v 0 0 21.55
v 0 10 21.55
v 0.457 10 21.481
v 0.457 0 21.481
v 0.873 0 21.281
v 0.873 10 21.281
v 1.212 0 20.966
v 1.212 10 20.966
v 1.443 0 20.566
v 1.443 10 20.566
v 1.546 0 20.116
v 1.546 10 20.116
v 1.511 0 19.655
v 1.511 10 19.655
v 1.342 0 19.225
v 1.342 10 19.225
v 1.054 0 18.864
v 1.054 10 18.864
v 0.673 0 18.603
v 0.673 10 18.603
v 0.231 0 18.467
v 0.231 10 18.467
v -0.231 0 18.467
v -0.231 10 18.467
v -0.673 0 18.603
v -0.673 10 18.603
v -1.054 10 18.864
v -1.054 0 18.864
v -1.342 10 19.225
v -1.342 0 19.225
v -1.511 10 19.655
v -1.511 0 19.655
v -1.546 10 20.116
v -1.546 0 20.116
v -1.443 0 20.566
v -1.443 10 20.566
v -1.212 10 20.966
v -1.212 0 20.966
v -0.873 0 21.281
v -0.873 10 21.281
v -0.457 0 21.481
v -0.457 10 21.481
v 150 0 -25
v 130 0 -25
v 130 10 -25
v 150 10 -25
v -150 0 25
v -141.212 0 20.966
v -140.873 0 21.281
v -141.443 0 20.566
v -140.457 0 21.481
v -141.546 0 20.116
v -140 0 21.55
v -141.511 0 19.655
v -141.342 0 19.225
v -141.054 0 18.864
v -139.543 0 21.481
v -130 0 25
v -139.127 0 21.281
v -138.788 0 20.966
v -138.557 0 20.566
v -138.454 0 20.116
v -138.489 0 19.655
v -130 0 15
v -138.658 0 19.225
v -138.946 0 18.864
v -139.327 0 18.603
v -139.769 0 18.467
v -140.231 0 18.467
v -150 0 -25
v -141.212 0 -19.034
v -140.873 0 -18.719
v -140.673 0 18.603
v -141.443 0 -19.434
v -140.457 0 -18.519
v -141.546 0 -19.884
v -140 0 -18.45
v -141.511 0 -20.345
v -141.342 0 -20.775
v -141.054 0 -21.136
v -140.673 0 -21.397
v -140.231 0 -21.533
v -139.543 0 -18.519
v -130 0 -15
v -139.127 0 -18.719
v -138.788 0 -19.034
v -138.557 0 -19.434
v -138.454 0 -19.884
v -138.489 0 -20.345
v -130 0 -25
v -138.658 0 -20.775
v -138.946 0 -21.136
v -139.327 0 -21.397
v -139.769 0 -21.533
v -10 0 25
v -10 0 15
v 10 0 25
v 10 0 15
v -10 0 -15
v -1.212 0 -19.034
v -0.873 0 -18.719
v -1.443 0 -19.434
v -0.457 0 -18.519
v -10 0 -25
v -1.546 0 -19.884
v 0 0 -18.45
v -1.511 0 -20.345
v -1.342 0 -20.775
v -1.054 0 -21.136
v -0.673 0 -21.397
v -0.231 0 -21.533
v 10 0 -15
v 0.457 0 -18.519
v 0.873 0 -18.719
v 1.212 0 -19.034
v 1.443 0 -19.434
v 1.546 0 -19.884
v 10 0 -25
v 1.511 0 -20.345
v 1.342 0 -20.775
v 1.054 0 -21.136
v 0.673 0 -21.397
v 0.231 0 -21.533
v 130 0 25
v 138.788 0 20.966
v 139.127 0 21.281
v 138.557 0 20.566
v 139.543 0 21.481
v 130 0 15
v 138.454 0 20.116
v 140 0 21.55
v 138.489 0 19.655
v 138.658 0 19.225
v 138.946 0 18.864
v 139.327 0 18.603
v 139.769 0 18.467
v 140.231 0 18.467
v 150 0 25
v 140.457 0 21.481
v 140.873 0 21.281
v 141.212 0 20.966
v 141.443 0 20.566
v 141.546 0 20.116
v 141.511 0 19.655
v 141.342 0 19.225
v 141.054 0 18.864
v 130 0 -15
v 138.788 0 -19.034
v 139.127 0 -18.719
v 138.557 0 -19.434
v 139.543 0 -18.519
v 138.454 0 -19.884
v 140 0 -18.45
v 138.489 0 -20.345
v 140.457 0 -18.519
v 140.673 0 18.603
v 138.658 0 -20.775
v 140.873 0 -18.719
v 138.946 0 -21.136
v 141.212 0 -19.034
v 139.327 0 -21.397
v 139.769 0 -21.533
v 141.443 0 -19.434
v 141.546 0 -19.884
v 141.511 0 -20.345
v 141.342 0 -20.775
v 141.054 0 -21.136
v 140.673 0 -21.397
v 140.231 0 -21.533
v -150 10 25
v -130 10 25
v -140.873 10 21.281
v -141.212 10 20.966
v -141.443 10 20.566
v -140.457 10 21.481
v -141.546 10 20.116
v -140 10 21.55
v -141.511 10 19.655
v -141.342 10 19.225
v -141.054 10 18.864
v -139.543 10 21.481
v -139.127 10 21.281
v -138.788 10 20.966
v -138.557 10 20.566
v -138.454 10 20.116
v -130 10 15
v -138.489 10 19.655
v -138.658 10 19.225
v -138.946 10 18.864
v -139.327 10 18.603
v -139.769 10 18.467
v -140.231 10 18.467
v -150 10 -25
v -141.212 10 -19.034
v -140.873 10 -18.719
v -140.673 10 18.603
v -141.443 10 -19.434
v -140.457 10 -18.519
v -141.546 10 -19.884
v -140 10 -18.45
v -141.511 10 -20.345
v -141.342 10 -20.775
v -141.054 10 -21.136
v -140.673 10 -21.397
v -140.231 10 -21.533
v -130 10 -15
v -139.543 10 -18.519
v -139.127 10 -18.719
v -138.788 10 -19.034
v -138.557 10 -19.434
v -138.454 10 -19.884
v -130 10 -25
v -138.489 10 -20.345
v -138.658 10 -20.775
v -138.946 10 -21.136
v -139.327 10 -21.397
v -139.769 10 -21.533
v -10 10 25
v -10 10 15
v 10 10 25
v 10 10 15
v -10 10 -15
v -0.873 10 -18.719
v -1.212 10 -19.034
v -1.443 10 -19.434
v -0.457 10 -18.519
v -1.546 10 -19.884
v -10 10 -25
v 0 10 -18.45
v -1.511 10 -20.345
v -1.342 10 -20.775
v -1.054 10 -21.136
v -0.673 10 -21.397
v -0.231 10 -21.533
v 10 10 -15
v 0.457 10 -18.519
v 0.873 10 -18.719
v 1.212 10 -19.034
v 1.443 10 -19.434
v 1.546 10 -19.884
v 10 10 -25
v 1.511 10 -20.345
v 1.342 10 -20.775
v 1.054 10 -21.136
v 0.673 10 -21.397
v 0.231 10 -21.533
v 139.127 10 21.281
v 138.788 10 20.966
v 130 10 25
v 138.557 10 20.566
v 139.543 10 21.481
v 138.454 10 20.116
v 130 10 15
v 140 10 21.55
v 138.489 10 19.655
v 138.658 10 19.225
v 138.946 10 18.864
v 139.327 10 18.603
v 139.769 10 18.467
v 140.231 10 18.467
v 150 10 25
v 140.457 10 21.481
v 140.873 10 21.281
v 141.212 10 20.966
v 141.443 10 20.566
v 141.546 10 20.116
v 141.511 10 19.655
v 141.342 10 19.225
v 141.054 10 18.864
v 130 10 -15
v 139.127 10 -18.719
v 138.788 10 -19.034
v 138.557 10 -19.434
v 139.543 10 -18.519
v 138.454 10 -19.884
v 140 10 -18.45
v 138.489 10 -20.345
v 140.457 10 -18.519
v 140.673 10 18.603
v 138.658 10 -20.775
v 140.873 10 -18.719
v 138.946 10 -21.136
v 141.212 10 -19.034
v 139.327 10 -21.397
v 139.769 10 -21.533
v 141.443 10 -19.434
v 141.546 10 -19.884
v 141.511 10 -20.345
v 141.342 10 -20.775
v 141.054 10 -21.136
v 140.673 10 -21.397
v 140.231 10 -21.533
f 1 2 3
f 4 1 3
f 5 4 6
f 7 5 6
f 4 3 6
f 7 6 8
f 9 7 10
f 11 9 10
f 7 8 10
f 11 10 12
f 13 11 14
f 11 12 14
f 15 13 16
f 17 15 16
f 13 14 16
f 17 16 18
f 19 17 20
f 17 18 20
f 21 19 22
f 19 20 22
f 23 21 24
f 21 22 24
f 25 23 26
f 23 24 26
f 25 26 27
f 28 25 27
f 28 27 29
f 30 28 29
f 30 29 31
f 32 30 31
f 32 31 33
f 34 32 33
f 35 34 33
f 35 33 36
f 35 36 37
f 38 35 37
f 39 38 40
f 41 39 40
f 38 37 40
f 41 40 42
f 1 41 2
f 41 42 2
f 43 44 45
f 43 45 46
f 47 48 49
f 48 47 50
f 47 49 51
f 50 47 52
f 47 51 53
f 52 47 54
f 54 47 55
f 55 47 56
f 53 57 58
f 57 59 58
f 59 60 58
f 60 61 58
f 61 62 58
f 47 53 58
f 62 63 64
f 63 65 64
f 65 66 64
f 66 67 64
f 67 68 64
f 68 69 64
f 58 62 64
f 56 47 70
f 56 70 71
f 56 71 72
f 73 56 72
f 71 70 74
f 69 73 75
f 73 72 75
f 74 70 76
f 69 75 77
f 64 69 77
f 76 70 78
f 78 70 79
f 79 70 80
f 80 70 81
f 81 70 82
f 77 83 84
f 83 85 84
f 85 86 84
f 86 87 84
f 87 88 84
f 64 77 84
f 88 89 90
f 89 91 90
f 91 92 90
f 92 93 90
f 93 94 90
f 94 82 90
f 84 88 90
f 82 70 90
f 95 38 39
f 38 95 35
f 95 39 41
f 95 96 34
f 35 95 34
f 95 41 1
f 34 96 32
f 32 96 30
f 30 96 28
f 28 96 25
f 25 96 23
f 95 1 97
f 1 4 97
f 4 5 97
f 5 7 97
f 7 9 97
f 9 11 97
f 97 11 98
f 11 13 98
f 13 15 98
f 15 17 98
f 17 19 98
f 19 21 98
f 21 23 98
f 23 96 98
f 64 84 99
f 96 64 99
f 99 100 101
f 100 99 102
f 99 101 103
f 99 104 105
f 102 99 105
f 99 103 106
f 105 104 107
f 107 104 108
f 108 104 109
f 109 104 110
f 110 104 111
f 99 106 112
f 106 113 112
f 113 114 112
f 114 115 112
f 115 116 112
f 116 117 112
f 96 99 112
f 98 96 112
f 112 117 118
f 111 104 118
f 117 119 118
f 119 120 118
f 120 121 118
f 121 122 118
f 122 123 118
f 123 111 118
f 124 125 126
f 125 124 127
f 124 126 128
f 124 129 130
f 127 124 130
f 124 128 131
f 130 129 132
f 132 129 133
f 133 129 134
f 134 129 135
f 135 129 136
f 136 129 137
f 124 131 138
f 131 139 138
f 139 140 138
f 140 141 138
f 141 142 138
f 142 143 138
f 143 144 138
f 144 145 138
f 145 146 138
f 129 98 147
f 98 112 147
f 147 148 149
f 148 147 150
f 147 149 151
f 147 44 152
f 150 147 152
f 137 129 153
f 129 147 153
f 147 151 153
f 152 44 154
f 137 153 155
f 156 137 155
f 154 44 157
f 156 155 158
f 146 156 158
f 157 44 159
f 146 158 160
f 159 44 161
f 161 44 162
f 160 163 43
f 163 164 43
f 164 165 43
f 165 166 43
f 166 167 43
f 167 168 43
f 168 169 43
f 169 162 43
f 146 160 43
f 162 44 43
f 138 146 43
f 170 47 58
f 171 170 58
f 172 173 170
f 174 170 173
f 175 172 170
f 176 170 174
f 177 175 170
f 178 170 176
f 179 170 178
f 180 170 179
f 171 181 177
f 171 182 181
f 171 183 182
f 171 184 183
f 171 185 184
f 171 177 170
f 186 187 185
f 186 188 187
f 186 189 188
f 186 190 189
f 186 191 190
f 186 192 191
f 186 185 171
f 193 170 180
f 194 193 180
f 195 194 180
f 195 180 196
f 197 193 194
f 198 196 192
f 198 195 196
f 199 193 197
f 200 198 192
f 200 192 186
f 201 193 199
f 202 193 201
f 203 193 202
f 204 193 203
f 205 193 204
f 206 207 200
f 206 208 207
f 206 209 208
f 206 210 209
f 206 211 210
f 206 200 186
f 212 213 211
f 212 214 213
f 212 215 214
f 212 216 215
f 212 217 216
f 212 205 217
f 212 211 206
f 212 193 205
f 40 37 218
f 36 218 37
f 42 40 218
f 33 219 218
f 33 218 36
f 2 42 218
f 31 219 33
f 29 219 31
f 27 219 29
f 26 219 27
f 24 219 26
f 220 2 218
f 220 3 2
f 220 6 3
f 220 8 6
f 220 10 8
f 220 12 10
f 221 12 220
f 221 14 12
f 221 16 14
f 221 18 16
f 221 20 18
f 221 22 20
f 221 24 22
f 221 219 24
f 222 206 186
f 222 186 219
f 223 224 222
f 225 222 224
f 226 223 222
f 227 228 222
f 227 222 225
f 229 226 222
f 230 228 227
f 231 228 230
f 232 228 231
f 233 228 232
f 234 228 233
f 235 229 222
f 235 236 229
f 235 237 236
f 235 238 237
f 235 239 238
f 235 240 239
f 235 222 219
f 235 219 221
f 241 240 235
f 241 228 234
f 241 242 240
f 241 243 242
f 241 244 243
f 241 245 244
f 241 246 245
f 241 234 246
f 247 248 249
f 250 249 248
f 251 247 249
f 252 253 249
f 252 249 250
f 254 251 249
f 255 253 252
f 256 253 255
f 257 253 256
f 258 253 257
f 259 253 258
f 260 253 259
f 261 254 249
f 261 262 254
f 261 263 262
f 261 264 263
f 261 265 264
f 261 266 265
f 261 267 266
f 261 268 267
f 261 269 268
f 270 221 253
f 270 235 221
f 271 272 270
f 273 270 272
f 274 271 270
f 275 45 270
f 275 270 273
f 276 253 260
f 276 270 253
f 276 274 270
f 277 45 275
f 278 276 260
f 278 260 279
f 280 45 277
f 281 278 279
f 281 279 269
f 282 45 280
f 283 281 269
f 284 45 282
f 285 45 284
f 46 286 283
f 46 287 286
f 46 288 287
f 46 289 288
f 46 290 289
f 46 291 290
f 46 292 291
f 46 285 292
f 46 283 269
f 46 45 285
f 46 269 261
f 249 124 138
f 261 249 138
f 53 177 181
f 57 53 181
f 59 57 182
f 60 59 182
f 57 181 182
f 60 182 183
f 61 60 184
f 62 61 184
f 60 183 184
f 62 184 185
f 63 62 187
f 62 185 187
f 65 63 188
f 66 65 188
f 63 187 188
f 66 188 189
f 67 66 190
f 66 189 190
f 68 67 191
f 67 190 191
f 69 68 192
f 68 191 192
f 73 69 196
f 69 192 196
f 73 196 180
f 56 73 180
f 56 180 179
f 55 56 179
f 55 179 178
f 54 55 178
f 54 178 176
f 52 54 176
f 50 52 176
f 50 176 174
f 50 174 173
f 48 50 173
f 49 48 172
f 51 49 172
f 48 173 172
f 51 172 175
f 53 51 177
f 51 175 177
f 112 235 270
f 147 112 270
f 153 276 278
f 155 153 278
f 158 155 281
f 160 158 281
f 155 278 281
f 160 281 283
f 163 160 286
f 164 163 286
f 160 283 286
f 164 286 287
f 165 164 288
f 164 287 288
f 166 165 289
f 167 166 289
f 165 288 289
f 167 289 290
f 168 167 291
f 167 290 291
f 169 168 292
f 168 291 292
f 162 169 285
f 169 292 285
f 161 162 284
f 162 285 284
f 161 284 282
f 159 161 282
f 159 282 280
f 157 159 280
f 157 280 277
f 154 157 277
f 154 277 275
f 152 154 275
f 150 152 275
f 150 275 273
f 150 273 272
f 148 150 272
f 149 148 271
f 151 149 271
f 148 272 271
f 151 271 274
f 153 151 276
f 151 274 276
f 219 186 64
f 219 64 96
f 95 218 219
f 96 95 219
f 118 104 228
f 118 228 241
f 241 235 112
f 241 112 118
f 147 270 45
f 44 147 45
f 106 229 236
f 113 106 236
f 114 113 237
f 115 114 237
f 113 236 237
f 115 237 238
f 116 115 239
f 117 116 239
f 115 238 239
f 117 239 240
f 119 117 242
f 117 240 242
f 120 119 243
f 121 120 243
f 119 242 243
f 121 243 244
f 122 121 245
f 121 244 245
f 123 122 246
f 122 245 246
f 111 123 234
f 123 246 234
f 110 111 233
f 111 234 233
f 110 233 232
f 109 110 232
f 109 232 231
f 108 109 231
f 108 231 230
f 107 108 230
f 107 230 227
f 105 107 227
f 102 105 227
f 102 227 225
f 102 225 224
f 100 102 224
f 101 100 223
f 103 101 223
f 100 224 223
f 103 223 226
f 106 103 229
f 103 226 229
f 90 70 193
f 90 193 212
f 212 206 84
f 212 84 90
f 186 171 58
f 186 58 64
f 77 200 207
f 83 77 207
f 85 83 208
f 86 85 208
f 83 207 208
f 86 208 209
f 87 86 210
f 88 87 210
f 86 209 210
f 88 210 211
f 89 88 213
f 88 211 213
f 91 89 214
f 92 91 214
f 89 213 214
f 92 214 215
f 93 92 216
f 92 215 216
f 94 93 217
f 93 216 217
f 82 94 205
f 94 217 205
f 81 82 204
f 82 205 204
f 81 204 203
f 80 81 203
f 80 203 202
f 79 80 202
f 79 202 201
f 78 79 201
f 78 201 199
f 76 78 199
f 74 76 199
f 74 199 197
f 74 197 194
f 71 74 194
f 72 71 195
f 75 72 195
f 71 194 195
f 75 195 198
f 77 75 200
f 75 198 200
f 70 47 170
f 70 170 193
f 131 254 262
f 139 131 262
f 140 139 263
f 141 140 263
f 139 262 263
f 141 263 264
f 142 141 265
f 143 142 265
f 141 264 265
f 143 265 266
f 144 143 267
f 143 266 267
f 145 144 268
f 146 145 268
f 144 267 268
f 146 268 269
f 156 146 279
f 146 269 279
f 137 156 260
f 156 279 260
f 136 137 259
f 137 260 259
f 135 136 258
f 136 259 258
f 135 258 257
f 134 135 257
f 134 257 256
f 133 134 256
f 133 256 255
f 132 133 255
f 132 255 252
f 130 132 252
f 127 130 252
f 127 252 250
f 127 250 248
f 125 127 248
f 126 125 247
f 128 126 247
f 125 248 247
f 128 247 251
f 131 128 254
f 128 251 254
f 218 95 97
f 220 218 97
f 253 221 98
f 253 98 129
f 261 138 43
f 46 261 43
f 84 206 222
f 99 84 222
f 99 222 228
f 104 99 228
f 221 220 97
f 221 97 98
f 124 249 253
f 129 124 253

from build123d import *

# Parameters (mm, degrees)
IZIM1_W                     = 300
IZIM1_H                     = 50
Y_KSEKLIK_EKSTR_ZYON1_DEPTH = 10
IZIM2_R                     = 1.55
IZIM2_W                     = 120
IZIM2_H                     = 10
KES_EKSTR_ZYON1_DEPTH       = 10


with BuildPart() as part:
    # Çizim1 → Yükseklik-Ekstrüzyon1 (new body)
    with BuildSketch(Plane(origin=(0, 0, 0), x_dir=(1, 0, 0), z_dir=(0, 1, 0))):
        Rectangle(IZIM1_W, IZIM1_H)
    extrude(amount=Y_KSEKLIK_EKSTR_ZYON1_DEPTH)

    # Çizim2 → Kes-Ekstrüzyon1 (cut)
    with BuildSketch(Plane(origin=(0, 10, 0), x_dir=(1, 0, 0), z_dir=(0, 1, 0))):
        with Locations(Location((140, 20, 0), (0, 0, 270))):
            Circle(IZIM2_R)
        with Locations(Location((0, 20, 0), (0, 0, 270))):
            Circle(IZIM2_R)
        with Locations(Location((-140, 20, 0), (0, 0, 270))):
            Circle(IZIM2_R)
        with Locations(Location((0, -20, 0), (0, 0, 270))):
            Circle(IZIM2_R)
        with Locations(Location((-140, -20, 0), (0, 0, 270))):
            Circle(IZIM2_R)
        with Locations(Location((140, -20, 0), (0, 0, 270))):
            Circle(IZIM2_R)
        with Locations((-70, -20)):
            Rectangle(IZIM2_W, IZIM2_H)
        with Locations((70, -20)):
            Rectangle(IZIM2_W, IZIM2_H)
        with Locations((-70, 20)):
            Rectangle(IZIM2_W, IZIM2_H)
        with Locations((70, 20)):
            Rectangle(IZIM2_W, IZIM2_H)
    extrude(amount=-KES_EKSTR_ZYON1_DEPTH, mode=Mode.SUBTRACT)


solid = part.part
